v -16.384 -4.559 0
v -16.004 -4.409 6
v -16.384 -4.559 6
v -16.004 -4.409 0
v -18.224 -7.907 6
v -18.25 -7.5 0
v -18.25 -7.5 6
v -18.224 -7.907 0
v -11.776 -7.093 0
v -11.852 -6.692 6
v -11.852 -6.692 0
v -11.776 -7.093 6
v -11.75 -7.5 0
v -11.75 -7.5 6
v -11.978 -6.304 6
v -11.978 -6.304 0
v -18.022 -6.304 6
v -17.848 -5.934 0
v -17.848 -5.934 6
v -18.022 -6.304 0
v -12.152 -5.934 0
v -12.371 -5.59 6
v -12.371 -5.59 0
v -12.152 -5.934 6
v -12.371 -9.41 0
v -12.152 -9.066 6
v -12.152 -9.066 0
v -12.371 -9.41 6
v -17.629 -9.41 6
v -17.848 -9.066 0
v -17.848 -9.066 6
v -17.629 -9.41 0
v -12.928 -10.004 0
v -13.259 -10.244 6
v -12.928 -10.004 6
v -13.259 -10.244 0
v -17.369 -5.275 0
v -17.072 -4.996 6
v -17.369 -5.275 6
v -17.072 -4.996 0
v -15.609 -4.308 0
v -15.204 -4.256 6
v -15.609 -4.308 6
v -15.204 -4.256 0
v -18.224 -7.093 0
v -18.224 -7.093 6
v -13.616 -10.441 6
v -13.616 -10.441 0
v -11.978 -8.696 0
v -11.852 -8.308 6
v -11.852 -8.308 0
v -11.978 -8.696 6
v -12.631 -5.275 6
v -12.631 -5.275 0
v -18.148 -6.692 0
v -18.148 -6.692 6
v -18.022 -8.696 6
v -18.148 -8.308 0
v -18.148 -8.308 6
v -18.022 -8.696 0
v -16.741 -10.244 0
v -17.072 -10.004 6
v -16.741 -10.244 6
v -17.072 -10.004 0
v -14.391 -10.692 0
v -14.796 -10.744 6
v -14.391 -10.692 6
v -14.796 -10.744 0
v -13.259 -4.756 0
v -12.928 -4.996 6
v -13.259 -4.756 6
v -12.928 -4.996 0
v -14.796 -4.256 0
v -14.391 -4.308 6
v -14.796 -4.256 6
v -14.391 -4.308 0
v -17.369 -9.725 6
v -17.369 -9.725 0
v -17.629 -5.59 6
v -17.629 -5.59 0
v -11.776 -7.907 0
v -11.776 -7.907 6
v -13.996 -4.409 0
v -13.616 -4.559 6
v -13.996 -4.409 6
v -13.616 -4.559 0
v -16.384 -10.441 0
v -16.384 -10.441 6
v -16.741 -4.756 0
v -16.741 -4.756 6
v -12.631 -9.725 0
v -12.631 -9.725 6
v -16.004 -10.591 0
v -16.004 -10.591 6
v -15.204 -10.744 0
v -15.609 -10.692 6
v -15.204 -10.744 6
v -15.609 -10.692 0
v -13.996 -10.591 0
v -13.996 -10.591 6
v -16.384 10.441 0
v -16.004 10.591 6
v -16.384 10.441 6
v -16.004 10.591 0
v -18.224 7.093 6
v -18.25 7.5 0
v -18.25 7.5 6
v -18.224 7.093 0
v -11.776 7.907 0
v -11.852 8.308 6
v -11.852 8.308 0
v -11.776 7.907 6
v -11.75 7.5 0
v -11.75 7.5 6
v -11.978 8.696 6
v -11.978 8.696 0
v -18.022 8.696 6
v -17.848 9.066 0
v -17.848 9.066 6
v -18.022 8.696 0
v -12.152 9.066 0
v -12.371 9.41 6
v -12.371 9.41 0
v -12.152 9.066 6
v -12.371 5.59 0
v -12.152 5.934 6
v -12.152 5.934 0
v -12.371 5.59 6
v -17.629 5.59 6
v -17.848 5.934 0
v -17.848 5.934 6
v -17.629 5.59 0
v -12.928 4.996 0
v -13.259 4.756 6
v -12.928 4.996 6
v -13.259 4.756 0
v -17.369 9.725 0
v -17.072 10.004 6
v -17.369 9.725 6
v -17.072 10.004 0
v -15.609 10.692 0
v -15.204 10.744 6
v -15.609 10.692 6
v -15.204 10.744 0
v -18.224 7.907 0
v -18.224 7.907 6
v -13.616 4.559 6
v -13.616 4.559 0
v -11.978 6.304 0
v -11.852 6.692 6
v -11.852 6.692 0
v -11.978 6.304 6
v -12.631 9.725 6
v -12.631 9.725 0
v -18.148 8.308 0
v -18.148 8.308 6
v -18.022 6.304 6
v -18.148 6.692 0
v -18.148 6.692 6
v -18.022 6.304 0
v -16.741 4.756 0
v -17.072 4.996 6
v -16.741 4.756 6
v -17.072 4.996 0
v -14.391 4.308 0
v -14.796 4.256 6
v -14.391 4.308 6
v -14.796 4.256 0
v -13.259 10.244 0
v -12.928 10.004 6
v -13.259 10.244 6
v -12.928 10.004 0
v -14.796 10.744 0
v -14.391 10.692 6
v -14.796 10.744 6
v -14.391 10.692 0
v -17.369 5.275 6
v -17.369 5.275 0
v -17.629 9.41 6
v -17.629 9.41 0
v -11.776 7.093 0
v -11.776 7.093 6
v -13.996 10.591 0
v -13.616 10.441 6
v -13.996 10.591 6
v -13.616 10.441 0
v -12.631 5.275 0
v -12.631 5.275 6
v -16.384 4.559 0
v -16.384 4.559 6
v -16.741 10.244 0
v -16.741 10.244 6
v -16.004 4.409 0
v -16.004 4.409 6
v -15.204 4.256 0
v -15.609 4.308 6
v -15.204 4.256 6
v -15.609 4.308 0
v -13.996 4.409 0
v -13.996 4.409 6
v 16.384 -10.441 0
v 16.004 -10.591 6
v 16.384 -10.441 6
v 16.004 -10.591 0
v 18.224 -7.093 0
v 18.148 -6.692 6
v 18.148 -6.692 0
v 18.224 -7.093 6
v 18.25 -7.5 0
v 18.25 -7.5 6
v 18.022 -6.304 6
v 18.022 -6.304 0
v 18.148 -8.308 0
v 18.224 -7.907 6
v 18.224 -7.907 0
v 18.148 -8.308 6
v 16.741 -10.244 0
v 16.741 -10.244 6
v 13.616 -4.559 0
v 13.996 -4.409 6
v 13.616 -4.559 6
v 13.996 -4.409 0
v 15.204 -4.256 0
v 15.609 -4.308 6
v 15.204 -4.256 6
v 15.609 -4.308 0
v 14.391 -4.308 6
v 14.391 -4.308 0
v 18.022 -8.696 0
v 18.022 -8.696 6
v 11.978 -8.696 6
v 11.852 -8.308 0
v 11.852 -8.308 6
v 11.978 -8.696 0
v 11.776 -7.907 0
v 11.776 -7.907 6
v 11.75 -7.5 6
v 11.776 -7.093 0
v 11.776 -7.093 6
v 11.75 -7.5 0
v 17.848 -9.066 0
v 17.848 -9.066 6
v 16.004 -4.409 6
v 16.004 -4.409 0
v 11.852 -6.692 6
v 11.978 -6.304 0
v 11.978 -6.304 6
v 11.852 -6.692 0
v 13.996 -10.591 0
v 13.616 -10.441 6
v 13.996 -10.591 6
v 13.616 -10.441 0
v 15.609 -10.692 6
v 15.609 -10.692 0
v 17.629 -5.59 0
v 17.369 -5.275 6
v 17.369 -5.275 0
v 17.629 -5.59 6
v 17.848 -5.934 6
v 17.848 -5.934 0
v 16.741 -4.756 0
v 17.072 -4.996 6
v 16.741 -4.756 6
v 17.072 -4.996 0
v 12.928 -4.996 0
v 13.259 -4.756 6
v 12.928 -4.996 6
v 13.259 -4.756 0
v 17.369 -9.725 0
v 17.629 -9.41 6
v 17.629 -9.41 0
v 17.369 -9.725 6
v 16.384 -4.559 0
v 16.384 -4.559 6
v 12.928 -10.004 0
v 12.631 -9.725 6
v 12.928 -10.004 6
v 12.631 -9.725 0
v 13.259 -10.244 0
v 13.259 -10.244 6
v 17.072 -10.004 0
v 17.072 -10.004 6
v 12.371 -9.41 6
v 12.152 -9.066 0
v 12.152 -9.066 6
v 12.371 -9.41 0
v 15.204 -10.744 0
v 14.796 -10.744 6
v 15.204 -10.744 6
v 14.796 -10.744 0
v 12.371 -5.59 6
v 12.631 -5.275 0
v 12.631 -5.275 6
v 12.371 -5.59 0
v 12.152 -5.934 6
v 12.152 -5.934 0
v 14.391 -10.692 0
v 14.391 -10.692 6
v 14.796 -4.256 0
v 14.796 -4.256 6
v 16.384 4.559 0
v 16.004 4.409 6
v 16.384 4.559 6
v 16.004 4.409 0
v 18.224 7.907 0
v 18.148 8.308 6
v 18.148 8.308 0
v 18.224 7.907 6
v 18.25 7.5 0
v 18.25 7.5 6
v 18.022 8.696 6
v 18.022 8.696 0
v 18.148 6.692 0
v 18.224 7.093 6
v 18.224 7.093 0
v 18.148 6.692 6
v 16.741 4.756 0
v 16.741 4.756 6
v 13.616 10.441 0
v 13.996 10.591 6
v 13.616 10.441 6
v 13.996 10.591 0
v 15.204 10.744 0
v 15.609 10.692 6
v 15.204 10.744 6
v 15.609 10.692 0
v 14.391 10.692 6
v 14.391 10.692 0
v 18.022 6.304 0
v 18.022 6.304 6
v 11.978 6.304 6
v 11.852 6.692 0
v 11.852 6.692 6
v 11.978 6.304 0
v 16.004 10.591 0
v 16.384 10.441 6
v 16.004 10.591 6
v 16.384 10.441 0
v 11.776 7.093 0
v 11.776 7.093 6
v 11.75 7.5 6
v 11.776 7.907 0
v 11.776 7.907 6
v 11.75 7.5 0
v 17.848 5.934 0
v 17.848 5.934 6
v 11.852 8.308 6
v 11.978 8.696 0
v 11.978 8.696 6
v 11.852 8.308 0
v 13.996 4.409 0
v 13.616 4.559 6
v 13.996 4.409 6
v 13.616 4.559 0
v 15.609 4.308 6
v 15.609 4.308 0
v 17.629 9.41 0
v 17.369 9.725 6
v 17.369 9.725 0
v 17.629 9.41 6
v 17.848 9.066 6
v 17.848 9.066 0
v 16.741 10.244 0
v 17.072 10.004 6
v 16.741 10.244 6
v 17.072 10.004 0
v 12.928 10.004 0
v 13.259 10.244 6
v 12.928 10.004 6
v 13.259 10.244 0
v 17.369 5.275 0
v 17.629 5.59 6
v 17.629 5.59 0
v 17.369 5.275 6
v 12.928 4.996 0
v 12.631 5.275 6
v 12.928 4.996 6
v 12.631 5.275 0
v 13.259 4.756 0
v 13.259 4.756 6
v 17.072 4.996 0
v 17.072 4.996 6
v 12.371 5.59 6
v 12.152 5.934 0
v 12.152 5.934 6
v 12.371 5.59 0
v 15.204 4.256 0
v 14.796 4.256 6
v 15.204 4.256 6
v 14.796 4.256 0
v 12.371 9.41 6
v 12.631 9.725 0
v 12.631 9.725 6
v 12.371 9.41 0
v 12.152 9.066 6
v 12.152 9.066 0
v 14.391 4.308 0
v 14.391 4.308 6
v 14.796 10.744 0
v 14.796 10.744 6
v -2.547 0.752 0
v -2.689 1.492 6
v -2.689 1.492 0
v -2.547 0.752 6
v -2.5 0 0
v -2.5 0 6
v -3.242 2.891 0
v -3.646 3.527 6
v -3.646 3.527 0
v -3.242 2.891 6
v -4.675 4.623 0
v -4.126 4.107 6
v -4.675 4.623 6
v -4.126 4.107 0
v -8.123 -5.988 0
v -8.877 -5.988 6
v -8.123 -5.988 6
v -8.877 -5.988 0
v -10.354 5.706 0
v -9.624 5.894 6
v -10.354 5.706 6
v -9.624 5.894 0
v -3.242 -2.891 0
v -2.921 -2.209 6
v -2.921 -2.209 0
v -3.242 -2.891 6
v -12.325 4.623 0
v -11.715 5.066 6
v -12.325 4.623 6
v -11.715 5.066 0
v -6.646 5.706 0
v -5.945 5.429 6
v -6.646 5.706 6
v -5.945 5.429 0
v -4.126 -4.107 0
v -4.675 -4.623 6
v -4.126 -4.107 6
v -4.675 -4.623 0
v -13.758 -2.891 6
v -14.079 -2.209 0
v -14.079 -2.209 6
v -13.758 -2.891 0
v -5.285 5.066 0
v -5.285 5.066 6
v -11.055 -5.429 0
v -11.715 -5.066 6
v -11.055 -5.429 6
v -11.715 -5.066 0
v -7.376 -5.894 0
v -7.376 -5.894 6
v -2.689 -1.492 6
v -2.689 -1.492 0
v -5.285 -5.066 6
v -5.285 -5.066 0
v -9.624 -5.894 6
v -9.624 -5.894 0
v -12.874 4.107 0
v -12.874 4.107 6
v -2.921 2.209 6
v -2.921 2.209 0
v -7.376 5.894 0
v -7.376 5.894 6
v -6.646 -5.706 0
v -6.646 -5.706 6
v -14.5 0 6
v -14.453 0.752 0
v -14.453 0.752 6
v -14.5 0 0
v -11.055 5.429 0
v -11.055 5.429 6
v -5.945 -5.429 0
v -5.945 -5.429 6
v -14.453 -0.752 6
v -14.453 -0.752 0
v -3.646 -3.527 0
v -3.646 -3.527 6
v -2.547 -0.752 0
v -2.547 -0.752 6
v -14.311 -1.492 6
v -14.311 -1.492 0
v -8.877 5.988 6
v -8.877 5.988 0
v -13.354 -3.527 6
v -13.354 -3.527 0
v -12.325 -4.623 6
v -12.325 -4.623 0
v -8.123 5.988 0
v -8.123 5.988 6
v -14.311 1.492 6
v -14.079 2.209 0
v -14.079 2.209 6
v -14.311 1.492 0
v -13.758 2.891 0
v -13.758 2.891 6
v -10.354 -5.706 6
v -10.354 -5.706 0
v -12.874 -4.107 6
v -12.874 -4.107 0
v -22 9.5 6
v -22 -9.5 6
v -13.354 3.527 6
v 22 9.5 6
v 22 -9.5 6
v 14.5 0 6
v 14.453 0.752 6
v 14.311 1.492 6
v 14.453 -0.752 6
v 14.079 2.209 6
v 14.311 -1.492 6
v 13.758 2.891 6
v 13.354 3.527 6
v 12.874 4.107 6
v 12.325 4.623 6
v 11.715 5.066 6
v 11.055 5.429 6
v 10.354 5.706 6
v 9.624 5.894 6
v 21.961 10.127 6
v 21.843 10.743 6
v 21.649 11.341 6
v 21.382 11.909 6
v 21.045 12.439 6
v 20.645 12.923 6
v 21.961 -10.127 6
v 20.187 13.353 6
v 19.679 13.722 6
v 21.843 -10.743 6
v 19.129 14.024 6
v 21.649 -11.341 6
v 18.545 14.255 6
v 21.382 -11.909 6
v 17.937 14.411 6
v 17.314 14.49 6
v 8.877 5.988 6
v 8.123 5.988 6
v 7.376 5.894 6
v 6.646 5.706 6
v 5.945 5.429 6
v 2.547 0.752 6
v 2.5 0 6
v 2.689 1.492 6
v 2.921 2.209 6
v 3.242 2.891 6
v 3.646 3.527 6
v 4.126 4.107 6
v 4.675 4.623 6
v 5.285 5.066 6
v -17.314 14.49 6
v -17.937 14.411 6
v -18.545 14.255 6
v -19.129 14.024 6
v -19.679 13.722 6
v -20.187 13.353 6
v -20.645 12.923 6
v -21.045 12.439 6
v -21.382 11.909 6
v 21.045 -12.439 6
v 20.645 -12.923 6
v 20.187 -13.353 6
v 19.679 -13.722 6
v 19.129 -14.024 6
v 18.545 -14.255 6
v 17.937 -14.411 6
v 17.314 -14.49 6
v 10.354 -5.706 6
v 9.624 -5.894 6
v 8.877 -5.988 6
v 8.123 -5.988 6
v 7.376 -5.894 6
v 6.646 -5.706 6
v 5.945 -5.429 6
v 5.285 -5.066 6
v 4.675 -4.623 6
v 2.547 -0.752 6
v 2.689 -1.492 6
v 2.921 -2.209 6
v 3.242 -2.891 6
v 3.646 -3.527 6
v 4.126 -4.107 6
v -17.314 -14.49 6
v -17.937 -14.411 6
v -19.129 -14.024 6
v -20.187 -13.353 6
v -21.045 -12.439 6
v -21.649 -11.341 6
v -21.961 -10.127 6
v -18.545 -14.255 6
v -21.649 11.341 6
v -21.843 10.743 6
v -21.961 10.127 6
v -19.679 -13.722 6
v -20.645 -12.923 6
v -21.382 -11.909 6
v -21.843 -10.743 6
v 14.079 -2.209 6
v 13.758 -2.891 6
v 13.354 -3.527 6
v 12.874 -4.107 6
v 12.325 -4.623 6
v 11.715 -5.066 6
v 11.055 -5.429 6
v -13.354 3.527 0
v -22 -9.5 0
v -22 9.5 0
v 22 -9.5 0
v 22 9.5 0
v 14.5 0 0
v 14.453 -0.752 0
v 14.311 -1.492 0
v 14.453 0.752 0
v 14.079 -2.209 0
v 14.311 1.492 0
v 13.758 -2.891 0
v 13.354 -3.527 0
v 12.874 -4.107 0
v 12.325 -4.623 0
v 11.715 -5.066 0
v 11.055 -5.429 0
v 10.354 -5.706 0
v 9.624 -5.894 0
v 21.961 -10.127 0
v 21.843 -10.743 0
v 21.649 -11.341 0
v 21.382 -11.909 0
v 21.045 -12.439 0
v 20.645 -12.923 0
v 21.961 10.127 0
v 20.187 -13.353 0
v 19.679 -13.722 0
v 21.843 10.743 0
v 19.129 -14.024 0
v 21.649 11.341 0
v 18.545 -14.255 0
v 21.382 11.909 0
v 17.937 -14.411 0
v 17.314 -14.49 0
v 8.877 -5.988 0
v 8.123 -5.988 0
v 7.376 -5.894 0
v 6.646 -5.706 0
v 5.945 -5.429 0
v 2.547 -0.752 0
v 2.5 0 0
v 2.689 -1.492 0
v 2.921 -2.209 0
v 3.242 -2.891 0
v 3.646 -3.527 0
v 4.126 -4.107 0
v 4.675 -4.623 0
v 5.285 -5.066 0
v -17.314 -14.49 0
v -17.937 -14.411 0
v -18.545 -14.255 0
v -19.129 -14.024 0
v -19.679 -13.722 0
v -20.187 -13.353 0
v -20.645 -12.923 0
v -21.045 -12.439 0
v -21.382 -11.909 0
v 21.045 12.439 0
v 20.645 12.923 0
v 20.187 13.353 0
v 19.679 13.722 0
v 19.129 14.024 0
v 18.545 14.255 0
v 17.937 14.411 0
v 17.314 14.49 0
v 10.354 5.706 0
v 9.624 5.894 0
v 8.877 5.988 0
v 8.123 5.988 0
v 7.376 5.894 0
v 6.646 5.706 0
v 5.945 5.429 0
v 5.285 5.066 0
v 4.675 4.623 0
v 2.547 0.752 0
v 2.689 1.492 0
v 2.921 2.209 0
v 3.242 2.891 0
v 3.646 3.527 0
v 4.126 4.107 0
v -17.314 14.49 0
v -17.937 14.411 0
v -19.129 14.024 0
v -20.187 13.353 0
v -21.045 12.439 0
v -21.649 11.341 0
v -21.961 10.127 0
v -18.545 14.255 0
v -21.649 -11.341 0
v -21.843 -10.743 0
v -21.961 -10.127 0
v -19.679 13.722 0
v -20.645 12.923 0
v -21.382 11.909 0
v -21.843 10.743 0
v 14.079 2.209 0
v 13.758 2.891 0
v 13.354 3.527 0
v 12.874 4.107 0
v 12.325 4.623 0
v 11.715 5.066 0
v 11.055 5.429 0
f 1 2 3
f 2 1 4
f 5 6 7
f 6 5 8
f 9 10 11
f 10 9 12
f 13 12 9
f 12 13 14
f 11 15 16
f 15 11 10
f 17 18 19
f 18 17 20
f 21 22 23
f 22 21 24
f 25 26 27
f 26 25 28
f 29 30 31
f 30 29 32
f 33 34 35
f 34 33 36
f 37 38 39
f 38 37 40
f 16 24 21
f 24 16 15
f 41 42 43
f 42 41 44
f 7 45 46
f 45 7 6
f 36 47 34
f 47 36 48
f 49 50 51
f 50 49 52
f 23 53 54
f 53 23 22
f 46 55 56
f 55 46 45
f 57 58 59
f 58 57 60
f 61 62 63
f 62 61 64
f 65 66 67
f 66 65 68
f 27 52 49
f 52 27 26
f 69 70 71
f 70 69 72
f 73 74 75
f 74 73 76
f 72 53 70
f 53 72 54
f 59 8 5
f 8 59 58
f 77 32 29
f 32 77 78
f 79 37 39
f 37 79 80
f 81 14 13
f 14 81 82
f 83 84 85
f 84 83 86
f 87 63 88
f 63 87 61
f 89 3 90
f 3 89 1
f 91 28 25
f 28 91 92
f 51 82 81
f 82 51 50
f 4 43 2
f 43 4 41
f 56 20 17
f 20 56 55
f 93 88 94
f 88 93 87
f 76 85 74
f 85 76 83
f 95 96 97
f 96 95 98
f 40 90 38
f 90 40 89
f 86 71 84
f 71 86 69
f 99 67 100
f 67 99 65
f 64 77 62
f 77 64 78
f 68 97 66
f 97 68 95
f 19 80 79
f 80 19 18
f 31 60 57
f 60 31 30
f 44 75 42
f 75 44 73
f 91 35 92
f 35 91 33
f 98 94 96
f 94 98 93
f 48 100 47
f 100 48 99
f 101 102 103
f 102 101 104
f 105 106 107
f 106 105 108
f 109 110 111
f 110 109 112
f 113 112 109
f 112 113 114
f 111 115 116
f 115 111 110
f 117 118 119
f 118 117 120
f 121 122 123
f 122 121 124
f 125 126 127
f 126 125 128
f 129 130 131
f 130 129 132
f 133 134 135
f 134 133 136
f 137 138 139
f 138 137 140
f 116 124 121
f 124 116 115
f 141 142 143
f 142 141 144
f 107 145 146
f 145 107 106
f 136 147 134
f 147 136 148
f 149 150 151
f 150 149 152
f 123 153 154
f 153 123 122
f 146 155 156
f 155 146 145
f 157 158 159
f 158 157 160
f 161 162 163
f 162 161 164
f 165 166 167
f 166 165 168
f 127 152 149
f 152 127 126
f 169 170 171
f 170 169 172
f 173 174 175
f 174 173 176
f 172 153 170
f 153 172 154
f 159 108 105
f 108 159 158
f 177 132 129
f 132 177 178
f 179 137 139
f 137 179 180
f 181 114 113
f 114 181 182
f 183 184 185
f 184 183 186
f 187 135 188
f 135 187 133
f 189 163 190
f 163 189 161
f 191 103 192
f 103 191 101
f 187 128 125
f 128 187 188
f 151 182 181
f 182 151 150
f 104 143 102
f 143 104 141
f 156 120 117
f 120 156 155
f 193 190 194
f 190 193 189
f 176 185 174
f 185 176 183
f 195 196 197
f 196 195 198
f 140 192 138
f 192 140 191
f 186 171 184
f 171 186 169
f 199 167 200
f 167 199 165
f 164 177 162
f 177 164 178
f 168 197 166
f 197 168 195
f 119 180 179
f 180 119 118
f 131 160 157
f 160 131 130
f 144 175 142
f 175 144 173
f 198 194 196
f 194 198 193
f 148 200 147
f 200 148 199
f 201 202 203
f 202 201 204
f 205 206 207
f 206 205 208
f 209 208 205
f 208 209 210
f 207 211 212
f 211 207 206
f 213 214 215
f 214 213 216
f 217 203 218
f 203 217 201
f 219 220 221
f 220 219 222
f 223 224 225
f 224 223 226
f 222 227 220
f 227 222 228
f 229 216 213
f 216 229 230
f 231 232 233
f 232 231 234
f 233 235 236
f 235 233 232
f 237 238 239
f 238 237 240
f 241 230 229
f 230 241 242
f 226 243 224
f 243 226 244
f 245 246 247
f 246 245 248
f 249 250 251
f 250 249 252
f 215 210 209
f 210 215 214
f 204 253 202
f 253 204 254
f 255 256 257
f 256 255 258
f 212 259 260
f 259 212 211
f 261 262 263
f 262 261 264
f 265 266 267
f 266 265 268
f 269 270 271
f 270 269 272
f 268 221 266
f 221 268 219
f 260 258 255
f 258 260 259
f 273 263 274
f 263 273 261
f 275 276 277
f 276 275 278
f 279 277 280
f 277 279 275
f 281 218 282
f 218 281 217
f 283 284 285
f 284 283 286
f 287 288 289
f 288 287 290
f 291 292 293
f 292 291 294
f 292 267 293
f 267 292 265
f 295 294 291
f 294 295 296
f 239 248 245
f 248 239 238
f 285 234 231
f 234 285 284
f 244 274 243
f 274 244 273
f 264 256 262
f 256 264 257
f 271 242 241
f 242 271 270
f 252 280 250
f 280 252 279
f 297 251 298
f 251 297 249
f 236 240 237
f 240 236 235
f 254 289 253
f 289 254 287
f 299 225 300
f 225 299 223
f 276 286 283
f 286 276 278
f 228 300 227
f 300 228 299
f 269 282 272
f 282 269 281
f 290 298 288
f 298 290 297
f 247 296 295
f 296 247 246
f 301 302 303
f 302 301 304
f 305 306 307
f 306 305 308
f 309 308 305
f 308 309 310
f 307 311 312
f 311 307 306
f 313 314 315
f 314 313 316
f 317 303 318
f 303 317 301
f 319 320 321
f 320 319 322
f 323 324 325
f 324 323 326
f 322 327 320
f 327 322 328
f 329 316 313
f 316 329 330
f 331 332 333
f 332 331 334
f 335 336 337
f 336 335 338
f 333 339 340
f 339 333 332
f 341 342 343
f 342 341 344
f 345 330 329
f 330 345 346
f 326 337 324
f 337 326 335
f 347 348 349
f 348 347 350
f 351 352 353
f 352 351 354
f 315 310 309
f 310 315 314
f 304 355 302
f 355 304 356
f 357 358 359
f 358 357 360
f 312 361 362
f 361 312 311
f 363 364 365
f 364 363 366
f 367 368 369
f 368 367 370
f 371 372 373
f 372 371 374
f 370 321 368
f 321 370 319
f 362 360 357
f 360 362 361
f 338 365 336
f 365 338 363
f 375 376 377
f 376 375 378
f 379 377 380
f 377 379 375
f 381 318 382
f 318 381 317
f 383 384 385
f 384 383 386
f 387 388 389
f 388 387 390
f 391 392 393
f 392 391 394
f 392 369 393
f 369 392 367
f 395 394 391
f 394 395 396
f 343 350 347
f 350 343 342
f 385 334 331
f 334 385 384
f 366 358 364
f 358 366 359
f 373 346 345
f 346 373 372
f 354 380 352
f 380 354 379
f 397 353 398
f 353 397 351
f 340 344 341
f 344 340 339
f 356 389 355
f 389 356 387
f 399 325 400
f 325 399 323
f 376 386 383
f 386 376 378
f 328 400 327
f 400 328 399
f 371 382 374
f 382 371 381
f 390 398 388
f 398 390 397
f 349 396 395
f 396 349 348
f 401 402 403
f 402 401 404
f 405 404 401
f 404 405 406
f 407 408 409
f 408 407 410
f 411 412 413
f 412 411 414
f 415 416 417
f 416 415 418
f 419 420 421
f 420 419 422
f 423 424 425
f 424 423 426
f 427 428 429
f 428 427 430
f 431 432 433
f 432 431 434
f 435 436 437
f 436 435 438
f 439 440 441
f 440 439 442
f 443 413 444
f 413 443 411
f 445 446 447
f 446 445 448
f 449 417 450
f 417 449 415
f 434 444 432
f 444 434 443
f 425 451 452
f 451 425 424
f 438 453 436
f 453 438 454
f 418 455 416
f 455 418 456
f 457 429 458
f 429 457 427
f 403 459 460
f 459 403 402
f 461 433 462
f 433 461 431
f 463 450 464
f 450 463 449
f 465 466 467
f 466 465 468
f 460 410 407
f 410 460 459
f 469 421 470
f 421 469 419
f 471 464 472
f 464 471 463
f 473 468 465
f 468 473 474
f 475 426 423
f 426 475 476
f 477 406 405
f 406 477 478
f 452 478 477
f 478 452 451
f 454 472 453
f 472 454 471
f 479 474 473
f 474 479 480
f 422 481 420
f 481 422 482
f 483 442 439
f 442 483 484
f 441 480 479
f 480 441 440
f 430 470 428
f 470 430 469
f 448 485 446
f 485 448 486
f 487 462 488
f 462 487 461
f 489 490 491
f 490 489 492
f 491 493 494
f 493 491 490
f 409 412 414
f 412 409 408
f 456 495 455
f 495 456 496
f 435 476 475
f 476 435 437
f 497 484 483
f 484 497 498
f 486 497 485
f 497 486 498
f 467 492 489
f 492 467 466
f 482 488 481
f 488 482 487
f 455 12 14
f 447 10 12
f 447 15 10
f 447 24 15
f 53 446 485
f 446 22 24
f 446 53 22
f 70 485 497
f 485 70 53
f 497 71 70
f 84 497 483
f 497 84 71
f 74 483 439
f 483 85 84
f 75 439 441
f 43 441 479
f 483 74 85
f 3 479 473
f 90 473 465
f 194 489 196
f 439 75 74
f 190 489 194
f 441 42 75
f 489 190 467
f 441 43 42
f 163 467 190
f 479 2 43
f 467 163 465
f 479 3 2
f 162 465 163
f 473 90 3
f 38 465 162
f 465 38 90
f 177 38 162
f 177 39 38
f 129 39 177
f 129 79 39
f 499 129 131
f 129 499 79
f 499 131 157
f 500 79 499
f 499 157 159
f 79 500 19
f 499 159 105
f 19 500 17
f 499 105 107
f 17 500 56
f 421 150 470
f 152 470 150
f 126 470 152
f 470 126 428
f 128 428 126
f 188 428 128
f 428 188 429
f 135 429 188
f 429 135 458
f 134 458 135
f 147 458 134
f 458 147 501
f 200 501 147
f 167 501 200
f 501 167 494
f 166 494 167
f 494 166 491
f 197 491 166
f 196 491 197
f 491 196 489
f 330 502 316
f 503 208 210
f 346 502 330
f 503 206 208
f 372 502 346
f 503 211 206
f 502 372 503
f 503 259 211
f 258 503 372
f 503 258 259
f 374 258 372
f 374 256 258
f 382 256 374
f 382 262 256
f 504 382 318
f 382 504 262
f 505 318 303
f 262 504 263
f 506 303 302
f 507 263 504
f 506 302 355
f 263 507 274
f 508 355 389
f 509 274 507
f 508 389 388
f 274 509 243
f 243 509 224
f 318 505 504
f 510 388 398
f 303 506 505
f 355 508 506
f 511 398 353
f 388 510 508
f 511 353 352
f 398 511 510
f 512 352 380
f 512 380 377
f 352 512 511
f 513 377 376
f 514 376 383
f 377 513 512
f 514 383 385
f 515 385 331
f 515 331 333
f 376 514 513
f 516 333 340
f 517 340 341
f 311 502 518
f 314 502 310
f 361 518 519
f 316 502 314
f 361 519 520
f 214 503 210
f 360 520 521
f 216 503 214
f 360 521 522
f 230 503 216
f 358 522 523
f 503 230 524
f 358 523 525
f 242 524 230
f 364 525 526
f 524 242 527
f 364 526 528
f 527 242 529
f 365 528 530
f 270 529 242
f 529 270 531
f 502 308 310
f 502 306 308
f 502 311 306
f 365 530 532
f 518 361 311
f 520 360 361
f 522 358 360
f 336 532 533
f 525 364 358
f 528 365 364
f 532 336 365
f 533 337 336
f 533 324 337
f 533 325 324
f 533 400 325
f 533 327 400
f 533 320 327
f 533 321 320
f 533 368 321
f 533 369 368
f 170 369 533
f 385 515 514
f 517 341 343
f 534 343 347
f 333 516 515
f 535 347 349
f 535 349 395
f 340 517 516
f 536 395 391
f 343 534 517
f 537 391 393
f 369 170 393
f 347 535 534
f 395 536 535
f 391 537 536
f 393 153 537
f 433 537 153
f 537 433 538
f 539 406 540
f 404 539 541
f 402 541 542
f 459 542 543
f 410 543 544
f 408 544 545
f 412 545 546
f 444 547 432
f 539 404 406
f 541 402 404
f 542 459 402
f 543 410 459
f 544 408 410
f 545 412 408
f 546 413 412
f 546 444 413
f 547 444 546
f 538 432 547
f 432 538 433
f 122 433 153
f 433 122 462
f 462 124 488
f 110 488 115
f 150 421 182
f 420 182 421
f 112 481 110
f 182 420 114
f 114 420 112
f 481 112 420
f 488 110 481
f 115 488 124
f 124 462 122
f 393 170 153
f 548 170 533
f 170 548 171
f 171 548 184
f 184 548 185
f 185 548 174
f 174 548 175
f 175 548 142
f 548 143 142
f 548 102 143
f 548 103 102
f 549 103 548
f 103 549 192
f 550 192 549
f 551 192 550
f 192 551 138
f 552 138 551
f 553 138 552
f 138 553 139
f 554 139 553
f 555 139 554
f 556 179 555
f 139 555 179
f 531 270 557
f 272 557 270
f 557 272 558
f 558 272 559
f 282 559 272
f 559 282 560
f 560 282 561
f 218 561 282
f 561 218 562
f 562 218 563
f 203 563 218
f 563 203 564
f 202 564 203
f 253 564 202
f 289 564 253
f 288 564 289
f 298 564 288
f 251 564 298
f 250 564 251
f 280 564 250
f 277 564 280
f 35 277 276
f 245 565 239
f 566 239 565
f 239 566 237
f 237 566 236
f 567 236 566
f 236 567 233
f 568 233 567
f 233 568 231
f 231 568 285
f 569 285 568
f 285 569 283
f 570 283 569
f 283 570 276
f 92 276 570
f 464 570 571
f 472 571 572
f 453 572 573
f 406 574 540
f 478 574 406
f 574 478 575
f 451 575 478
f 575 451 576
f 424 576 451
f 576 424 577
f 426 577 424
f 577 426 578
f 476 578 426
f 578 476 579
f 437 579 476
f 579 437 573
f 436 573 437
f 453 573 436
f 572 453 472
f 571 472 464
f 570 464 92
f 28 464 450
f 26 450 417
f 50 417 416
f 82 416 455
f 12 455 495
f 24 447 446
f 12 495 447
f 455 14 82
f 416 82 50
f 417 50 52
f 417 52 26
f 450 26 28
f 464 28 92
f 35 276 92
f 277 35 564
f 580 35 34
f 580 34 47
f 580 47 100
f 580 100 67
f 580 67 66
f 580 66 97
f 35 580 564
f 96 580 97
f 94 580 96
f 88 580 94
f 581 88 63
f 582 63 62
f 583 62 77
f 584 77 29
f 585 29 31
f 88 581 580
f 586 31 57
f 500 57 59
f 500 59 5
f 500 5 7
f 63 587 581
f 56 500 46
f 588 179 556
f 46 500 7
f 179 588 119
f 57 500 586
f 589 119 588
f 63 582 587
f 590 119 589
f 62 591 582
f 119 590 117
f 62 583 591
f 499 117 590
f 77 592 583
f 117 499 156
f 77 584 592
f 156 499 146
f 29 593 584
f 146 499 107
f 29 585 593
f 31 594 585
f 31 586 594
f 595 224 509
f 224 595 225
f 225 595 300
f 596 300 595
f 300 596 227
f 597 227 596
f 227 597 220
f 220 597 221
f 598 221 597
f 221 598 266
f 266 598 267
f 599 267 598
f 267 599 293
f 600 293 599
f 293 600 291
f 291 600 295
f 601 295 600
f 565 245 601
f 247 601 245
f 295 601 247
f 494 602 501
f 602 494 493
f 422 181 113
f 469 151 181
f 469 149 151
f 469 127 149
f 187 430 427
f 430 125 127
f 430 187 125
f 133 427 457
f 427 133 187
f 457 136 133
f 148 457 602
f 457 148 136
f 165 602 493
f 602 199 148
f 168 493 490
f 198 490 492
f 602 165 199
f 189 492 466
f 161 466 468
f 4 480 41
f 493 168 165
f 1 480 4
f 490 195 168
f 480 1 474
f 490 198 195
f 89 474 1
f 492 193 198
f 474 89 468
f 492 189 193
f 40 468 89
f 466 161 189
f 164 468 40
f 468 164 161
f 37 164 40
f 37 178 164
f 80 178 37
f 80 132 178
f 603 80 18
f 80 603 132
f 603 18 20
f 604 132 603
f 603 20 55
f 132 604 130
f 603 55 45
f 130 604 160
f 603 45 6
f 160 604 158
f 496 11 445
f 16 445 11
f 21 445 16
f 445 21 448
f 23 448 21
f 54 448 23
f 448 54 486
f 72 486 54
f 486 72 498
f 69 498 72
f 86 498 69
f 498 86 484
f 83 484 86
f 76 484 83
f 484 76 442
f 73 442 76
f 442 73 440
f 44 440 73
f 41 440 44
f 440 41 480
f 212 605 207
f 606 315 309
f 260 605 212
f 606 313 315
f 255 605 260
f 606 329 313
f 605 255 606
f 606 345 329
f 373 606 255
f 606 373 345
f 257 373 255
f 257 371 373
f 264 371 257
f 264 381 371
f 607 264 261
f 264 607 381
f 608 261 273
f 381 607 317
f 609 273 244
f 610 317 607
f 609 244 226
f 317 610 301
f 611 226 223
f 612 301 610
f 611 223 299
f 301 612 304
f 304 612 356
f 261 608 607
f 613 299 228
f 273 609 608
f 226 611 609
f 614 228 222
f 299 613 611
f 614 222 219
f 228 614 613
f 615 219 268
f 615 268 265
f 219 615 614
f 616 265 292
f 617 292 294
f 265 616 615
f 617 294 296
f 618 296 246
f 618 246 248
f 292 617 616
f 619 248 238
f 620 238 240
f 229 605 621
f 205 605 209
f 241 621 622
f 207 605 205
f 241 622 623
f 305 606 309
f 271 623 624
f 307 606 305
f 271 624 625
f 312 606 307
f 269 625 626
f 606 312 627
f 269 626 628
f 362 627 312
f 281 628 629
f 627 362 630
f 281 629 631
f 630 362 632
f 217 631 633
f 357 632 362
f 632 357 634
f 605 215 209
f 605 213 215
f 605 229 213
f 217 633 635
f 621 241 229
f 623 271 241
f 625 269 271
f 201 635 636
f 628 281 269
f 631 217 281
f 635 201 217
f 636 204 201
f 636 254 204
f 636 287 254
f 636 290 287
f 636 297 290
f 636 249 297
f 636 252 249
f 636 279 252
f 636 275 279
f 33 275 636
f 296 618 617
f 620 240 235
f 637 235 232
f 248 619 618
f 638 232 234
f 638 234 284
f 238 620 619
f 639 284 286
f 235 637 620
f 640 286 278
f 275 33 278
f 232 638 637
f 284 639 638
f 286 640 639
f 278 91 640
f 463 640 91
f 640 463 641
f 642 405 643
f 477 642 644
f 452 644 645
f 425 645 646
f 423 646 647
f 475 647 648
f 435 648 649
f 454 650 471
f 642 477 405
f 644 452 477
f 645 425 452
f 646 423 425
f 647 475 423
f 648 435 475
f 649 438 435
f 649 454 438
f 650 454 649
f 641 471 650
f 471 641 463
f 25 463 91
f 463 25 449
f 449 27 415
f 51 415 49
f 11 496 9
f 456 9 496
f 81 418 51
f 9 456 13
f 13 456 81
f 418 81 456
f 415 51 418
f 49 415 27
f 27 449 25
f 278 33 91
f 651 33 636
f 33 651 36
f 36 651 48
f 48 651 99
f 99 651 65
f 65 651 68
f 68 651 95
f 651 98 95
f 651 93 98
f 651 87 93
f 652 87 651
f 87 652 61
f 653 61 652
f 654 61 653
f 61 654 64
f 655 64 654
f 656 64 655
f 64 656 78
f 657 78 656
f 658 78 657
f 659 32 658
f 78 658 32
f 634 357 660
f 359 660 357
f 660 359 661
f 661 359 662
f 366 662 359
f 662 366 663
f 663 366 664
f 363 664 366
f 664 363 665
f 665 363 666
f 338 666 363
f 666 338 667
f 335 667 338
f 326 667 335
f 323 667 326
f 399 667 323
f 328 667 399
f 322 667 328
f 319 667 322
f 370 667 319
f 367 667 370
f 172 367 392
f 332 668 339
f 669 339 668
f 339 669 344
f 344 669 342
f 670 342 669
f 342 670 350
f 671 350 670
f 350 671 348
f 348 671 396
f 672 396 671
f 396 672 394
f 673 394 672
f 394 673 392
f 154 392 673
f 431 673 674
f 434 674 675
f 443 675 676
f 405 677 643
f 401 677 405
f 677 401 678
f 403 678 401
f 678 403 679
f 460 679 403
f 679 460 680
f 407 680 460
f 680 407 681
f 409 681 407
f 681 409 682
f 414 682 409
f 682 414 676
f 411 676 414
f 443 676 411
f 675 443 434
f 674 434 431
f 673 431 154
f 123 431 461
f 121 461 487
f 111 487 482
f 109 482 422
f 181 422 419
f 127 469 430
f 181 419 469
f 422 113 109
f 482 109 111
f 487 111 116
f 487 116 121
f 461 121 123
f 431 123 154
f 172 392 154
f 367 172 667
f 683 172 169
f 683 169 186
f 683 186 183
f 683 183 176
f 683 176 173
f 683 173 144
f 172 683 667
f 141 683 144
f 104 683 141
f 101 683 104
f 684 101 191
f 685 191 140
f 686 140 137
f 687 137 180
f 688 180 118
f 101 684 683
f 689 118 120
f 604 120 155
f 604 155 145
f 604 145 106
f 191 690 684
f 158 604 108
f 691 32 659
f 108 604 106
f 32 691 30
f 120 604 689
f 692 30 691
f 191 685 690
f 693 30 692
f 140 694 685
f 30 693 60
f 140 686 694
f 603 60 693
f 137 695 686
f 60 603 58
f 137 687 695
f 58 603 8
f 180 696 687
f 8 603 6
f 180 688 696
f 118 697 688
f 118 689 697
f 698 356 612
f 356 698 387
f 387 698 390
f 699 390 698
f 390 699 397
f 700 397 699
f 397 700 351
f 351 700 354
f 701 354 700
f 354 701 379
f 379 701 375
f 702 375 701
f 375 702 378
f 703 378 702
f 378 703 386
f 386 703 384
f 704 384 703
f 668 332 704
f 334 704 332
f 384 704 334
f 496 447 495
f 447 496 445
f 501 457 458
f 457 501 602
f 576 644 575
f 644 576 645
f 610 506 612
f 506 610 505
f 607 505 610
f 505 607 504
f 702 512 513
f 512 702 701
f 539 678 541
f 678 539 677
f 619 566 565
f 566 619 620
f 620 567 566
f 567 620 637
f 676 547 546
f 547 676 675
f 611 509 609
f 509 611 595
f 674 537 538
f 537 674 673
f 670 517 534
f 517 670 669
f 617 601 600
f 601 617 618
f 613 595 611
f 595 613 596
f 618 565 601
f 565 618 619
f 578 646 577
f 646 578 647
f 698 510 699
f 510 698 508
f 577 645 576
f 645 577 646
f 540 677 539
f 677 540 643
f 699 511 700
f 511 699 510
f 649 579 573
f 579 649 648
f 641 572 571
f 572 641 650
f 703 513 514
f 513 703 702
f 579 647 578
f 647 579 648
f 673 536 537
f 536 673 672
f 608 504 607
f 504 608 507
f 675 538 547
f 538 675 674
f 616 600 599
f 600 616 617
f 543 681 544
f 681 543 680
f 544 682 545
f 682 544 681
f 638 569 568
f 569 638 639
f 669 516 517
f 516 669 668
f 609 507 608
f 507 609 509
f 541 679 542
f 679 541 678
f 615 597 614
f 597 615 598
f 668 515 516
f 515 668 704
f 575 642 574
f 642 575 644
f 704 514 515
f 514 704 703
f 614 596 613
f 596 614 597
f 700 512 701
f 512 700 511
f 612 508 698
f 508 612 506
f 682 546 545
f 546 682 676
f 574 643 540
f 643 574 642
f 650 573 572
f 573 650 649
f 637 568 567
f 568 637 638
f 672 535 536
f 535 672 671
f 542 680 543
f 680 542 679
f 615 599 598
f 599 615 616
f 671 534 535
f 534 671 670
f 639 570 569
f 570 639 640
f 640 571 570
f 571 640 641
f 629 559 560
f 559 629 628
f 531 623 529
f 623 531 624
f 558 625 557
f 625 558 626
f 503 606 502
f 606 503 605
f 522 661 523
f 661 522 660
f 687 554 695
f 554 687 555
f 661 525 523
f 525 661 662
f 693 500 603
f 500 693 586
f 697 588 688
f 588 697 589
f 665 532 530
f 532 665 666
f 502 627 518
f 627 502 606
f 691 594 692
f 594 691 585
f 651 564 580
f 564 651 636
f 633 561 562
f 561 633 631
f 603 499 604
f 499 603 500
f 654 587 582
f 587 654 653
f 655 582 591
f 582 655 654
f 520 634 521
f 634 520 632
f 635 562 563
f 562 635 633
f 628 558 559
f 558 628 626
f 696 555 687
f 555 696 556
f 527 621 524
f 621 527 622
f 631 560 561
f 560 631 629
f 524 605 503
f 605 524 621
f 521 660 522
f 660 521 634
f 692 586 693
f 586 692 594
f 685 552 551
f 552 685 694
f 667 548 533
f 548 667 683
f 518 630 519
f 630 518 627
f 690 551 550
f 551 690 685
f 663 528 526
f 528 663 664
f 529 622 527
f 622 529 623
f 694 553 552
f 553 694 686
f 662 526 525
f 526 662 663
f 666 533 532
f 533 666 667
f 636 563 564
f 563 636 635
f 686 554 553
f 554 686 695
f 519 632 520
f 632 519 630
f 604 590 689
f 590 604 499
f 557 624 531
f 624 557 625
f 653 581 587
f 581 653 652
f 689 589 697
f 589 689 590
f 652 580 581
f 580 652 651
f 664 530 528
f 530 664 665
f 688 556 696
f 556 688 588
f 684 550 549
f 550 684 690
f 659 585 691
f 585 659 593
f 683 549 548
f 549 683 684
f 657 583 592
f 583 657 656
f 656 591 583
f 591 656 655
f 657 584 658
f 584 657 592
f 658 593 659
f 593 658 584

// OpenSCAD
$fn = 50;

difference() {
	union() {
		hull() {
			translate(v = [-17.0, 9.5, 0]) {
				cylinder(h = 6, r = 5);
			}
			translate(v = [17.0, 9.5, 0]) {
				cylinder(h = 6, r = 5);
			}
			translate(v = [-17.0, -9.5, 0]) {
				cylinder(h = 6, r = 5);
			}
			translate(v = [17.0, -9.5, 0]) {
				cylinder(h = 6, r = 5);
			}
		}
	}
	union() {
		translate(v = [-15.0, -7.5, -100.0]) {
			cylinder(h = 200, r = 3.25);
		}
		translate(v = [-15.0, 7.5, -100.0]) {
			cylinder(h = 200, r = 3.25);
		}
		translate(v = [15.0, -7.5, -100.0]) {
			cylinder(h = 200, r = 3.25);
		}
		translate(v = [15.0, 7.5, -100.0]) {
			cylinder(h = 200, r = 3.25);
		}
		translate(v = [-15.0, -7.5, -100.0]) {
			cylinder(h = 200, r = 1.8);
		}
		translate(v = [-15.0, 7.5, -100.0]) {
			cylinder(h = 200, r = 1.8);
		}
		translate(v = [15.0, -7.5, -100.0]) {
			cylinder(h = 200, r = 1.8);
		}
		translate(v = [15.0, 7.5, -100.0]) {
			cylinder(h = 200, r = 1.8);
		}
		translate(v = [-8.5, 0, 0.0]) {
			cylinder(h = 6, r = 6.0);
		}
		translate(v = [8.5, 0, 0.0]) {
			cylinder(h = 6, r = 6.0);
		}
	}
}
